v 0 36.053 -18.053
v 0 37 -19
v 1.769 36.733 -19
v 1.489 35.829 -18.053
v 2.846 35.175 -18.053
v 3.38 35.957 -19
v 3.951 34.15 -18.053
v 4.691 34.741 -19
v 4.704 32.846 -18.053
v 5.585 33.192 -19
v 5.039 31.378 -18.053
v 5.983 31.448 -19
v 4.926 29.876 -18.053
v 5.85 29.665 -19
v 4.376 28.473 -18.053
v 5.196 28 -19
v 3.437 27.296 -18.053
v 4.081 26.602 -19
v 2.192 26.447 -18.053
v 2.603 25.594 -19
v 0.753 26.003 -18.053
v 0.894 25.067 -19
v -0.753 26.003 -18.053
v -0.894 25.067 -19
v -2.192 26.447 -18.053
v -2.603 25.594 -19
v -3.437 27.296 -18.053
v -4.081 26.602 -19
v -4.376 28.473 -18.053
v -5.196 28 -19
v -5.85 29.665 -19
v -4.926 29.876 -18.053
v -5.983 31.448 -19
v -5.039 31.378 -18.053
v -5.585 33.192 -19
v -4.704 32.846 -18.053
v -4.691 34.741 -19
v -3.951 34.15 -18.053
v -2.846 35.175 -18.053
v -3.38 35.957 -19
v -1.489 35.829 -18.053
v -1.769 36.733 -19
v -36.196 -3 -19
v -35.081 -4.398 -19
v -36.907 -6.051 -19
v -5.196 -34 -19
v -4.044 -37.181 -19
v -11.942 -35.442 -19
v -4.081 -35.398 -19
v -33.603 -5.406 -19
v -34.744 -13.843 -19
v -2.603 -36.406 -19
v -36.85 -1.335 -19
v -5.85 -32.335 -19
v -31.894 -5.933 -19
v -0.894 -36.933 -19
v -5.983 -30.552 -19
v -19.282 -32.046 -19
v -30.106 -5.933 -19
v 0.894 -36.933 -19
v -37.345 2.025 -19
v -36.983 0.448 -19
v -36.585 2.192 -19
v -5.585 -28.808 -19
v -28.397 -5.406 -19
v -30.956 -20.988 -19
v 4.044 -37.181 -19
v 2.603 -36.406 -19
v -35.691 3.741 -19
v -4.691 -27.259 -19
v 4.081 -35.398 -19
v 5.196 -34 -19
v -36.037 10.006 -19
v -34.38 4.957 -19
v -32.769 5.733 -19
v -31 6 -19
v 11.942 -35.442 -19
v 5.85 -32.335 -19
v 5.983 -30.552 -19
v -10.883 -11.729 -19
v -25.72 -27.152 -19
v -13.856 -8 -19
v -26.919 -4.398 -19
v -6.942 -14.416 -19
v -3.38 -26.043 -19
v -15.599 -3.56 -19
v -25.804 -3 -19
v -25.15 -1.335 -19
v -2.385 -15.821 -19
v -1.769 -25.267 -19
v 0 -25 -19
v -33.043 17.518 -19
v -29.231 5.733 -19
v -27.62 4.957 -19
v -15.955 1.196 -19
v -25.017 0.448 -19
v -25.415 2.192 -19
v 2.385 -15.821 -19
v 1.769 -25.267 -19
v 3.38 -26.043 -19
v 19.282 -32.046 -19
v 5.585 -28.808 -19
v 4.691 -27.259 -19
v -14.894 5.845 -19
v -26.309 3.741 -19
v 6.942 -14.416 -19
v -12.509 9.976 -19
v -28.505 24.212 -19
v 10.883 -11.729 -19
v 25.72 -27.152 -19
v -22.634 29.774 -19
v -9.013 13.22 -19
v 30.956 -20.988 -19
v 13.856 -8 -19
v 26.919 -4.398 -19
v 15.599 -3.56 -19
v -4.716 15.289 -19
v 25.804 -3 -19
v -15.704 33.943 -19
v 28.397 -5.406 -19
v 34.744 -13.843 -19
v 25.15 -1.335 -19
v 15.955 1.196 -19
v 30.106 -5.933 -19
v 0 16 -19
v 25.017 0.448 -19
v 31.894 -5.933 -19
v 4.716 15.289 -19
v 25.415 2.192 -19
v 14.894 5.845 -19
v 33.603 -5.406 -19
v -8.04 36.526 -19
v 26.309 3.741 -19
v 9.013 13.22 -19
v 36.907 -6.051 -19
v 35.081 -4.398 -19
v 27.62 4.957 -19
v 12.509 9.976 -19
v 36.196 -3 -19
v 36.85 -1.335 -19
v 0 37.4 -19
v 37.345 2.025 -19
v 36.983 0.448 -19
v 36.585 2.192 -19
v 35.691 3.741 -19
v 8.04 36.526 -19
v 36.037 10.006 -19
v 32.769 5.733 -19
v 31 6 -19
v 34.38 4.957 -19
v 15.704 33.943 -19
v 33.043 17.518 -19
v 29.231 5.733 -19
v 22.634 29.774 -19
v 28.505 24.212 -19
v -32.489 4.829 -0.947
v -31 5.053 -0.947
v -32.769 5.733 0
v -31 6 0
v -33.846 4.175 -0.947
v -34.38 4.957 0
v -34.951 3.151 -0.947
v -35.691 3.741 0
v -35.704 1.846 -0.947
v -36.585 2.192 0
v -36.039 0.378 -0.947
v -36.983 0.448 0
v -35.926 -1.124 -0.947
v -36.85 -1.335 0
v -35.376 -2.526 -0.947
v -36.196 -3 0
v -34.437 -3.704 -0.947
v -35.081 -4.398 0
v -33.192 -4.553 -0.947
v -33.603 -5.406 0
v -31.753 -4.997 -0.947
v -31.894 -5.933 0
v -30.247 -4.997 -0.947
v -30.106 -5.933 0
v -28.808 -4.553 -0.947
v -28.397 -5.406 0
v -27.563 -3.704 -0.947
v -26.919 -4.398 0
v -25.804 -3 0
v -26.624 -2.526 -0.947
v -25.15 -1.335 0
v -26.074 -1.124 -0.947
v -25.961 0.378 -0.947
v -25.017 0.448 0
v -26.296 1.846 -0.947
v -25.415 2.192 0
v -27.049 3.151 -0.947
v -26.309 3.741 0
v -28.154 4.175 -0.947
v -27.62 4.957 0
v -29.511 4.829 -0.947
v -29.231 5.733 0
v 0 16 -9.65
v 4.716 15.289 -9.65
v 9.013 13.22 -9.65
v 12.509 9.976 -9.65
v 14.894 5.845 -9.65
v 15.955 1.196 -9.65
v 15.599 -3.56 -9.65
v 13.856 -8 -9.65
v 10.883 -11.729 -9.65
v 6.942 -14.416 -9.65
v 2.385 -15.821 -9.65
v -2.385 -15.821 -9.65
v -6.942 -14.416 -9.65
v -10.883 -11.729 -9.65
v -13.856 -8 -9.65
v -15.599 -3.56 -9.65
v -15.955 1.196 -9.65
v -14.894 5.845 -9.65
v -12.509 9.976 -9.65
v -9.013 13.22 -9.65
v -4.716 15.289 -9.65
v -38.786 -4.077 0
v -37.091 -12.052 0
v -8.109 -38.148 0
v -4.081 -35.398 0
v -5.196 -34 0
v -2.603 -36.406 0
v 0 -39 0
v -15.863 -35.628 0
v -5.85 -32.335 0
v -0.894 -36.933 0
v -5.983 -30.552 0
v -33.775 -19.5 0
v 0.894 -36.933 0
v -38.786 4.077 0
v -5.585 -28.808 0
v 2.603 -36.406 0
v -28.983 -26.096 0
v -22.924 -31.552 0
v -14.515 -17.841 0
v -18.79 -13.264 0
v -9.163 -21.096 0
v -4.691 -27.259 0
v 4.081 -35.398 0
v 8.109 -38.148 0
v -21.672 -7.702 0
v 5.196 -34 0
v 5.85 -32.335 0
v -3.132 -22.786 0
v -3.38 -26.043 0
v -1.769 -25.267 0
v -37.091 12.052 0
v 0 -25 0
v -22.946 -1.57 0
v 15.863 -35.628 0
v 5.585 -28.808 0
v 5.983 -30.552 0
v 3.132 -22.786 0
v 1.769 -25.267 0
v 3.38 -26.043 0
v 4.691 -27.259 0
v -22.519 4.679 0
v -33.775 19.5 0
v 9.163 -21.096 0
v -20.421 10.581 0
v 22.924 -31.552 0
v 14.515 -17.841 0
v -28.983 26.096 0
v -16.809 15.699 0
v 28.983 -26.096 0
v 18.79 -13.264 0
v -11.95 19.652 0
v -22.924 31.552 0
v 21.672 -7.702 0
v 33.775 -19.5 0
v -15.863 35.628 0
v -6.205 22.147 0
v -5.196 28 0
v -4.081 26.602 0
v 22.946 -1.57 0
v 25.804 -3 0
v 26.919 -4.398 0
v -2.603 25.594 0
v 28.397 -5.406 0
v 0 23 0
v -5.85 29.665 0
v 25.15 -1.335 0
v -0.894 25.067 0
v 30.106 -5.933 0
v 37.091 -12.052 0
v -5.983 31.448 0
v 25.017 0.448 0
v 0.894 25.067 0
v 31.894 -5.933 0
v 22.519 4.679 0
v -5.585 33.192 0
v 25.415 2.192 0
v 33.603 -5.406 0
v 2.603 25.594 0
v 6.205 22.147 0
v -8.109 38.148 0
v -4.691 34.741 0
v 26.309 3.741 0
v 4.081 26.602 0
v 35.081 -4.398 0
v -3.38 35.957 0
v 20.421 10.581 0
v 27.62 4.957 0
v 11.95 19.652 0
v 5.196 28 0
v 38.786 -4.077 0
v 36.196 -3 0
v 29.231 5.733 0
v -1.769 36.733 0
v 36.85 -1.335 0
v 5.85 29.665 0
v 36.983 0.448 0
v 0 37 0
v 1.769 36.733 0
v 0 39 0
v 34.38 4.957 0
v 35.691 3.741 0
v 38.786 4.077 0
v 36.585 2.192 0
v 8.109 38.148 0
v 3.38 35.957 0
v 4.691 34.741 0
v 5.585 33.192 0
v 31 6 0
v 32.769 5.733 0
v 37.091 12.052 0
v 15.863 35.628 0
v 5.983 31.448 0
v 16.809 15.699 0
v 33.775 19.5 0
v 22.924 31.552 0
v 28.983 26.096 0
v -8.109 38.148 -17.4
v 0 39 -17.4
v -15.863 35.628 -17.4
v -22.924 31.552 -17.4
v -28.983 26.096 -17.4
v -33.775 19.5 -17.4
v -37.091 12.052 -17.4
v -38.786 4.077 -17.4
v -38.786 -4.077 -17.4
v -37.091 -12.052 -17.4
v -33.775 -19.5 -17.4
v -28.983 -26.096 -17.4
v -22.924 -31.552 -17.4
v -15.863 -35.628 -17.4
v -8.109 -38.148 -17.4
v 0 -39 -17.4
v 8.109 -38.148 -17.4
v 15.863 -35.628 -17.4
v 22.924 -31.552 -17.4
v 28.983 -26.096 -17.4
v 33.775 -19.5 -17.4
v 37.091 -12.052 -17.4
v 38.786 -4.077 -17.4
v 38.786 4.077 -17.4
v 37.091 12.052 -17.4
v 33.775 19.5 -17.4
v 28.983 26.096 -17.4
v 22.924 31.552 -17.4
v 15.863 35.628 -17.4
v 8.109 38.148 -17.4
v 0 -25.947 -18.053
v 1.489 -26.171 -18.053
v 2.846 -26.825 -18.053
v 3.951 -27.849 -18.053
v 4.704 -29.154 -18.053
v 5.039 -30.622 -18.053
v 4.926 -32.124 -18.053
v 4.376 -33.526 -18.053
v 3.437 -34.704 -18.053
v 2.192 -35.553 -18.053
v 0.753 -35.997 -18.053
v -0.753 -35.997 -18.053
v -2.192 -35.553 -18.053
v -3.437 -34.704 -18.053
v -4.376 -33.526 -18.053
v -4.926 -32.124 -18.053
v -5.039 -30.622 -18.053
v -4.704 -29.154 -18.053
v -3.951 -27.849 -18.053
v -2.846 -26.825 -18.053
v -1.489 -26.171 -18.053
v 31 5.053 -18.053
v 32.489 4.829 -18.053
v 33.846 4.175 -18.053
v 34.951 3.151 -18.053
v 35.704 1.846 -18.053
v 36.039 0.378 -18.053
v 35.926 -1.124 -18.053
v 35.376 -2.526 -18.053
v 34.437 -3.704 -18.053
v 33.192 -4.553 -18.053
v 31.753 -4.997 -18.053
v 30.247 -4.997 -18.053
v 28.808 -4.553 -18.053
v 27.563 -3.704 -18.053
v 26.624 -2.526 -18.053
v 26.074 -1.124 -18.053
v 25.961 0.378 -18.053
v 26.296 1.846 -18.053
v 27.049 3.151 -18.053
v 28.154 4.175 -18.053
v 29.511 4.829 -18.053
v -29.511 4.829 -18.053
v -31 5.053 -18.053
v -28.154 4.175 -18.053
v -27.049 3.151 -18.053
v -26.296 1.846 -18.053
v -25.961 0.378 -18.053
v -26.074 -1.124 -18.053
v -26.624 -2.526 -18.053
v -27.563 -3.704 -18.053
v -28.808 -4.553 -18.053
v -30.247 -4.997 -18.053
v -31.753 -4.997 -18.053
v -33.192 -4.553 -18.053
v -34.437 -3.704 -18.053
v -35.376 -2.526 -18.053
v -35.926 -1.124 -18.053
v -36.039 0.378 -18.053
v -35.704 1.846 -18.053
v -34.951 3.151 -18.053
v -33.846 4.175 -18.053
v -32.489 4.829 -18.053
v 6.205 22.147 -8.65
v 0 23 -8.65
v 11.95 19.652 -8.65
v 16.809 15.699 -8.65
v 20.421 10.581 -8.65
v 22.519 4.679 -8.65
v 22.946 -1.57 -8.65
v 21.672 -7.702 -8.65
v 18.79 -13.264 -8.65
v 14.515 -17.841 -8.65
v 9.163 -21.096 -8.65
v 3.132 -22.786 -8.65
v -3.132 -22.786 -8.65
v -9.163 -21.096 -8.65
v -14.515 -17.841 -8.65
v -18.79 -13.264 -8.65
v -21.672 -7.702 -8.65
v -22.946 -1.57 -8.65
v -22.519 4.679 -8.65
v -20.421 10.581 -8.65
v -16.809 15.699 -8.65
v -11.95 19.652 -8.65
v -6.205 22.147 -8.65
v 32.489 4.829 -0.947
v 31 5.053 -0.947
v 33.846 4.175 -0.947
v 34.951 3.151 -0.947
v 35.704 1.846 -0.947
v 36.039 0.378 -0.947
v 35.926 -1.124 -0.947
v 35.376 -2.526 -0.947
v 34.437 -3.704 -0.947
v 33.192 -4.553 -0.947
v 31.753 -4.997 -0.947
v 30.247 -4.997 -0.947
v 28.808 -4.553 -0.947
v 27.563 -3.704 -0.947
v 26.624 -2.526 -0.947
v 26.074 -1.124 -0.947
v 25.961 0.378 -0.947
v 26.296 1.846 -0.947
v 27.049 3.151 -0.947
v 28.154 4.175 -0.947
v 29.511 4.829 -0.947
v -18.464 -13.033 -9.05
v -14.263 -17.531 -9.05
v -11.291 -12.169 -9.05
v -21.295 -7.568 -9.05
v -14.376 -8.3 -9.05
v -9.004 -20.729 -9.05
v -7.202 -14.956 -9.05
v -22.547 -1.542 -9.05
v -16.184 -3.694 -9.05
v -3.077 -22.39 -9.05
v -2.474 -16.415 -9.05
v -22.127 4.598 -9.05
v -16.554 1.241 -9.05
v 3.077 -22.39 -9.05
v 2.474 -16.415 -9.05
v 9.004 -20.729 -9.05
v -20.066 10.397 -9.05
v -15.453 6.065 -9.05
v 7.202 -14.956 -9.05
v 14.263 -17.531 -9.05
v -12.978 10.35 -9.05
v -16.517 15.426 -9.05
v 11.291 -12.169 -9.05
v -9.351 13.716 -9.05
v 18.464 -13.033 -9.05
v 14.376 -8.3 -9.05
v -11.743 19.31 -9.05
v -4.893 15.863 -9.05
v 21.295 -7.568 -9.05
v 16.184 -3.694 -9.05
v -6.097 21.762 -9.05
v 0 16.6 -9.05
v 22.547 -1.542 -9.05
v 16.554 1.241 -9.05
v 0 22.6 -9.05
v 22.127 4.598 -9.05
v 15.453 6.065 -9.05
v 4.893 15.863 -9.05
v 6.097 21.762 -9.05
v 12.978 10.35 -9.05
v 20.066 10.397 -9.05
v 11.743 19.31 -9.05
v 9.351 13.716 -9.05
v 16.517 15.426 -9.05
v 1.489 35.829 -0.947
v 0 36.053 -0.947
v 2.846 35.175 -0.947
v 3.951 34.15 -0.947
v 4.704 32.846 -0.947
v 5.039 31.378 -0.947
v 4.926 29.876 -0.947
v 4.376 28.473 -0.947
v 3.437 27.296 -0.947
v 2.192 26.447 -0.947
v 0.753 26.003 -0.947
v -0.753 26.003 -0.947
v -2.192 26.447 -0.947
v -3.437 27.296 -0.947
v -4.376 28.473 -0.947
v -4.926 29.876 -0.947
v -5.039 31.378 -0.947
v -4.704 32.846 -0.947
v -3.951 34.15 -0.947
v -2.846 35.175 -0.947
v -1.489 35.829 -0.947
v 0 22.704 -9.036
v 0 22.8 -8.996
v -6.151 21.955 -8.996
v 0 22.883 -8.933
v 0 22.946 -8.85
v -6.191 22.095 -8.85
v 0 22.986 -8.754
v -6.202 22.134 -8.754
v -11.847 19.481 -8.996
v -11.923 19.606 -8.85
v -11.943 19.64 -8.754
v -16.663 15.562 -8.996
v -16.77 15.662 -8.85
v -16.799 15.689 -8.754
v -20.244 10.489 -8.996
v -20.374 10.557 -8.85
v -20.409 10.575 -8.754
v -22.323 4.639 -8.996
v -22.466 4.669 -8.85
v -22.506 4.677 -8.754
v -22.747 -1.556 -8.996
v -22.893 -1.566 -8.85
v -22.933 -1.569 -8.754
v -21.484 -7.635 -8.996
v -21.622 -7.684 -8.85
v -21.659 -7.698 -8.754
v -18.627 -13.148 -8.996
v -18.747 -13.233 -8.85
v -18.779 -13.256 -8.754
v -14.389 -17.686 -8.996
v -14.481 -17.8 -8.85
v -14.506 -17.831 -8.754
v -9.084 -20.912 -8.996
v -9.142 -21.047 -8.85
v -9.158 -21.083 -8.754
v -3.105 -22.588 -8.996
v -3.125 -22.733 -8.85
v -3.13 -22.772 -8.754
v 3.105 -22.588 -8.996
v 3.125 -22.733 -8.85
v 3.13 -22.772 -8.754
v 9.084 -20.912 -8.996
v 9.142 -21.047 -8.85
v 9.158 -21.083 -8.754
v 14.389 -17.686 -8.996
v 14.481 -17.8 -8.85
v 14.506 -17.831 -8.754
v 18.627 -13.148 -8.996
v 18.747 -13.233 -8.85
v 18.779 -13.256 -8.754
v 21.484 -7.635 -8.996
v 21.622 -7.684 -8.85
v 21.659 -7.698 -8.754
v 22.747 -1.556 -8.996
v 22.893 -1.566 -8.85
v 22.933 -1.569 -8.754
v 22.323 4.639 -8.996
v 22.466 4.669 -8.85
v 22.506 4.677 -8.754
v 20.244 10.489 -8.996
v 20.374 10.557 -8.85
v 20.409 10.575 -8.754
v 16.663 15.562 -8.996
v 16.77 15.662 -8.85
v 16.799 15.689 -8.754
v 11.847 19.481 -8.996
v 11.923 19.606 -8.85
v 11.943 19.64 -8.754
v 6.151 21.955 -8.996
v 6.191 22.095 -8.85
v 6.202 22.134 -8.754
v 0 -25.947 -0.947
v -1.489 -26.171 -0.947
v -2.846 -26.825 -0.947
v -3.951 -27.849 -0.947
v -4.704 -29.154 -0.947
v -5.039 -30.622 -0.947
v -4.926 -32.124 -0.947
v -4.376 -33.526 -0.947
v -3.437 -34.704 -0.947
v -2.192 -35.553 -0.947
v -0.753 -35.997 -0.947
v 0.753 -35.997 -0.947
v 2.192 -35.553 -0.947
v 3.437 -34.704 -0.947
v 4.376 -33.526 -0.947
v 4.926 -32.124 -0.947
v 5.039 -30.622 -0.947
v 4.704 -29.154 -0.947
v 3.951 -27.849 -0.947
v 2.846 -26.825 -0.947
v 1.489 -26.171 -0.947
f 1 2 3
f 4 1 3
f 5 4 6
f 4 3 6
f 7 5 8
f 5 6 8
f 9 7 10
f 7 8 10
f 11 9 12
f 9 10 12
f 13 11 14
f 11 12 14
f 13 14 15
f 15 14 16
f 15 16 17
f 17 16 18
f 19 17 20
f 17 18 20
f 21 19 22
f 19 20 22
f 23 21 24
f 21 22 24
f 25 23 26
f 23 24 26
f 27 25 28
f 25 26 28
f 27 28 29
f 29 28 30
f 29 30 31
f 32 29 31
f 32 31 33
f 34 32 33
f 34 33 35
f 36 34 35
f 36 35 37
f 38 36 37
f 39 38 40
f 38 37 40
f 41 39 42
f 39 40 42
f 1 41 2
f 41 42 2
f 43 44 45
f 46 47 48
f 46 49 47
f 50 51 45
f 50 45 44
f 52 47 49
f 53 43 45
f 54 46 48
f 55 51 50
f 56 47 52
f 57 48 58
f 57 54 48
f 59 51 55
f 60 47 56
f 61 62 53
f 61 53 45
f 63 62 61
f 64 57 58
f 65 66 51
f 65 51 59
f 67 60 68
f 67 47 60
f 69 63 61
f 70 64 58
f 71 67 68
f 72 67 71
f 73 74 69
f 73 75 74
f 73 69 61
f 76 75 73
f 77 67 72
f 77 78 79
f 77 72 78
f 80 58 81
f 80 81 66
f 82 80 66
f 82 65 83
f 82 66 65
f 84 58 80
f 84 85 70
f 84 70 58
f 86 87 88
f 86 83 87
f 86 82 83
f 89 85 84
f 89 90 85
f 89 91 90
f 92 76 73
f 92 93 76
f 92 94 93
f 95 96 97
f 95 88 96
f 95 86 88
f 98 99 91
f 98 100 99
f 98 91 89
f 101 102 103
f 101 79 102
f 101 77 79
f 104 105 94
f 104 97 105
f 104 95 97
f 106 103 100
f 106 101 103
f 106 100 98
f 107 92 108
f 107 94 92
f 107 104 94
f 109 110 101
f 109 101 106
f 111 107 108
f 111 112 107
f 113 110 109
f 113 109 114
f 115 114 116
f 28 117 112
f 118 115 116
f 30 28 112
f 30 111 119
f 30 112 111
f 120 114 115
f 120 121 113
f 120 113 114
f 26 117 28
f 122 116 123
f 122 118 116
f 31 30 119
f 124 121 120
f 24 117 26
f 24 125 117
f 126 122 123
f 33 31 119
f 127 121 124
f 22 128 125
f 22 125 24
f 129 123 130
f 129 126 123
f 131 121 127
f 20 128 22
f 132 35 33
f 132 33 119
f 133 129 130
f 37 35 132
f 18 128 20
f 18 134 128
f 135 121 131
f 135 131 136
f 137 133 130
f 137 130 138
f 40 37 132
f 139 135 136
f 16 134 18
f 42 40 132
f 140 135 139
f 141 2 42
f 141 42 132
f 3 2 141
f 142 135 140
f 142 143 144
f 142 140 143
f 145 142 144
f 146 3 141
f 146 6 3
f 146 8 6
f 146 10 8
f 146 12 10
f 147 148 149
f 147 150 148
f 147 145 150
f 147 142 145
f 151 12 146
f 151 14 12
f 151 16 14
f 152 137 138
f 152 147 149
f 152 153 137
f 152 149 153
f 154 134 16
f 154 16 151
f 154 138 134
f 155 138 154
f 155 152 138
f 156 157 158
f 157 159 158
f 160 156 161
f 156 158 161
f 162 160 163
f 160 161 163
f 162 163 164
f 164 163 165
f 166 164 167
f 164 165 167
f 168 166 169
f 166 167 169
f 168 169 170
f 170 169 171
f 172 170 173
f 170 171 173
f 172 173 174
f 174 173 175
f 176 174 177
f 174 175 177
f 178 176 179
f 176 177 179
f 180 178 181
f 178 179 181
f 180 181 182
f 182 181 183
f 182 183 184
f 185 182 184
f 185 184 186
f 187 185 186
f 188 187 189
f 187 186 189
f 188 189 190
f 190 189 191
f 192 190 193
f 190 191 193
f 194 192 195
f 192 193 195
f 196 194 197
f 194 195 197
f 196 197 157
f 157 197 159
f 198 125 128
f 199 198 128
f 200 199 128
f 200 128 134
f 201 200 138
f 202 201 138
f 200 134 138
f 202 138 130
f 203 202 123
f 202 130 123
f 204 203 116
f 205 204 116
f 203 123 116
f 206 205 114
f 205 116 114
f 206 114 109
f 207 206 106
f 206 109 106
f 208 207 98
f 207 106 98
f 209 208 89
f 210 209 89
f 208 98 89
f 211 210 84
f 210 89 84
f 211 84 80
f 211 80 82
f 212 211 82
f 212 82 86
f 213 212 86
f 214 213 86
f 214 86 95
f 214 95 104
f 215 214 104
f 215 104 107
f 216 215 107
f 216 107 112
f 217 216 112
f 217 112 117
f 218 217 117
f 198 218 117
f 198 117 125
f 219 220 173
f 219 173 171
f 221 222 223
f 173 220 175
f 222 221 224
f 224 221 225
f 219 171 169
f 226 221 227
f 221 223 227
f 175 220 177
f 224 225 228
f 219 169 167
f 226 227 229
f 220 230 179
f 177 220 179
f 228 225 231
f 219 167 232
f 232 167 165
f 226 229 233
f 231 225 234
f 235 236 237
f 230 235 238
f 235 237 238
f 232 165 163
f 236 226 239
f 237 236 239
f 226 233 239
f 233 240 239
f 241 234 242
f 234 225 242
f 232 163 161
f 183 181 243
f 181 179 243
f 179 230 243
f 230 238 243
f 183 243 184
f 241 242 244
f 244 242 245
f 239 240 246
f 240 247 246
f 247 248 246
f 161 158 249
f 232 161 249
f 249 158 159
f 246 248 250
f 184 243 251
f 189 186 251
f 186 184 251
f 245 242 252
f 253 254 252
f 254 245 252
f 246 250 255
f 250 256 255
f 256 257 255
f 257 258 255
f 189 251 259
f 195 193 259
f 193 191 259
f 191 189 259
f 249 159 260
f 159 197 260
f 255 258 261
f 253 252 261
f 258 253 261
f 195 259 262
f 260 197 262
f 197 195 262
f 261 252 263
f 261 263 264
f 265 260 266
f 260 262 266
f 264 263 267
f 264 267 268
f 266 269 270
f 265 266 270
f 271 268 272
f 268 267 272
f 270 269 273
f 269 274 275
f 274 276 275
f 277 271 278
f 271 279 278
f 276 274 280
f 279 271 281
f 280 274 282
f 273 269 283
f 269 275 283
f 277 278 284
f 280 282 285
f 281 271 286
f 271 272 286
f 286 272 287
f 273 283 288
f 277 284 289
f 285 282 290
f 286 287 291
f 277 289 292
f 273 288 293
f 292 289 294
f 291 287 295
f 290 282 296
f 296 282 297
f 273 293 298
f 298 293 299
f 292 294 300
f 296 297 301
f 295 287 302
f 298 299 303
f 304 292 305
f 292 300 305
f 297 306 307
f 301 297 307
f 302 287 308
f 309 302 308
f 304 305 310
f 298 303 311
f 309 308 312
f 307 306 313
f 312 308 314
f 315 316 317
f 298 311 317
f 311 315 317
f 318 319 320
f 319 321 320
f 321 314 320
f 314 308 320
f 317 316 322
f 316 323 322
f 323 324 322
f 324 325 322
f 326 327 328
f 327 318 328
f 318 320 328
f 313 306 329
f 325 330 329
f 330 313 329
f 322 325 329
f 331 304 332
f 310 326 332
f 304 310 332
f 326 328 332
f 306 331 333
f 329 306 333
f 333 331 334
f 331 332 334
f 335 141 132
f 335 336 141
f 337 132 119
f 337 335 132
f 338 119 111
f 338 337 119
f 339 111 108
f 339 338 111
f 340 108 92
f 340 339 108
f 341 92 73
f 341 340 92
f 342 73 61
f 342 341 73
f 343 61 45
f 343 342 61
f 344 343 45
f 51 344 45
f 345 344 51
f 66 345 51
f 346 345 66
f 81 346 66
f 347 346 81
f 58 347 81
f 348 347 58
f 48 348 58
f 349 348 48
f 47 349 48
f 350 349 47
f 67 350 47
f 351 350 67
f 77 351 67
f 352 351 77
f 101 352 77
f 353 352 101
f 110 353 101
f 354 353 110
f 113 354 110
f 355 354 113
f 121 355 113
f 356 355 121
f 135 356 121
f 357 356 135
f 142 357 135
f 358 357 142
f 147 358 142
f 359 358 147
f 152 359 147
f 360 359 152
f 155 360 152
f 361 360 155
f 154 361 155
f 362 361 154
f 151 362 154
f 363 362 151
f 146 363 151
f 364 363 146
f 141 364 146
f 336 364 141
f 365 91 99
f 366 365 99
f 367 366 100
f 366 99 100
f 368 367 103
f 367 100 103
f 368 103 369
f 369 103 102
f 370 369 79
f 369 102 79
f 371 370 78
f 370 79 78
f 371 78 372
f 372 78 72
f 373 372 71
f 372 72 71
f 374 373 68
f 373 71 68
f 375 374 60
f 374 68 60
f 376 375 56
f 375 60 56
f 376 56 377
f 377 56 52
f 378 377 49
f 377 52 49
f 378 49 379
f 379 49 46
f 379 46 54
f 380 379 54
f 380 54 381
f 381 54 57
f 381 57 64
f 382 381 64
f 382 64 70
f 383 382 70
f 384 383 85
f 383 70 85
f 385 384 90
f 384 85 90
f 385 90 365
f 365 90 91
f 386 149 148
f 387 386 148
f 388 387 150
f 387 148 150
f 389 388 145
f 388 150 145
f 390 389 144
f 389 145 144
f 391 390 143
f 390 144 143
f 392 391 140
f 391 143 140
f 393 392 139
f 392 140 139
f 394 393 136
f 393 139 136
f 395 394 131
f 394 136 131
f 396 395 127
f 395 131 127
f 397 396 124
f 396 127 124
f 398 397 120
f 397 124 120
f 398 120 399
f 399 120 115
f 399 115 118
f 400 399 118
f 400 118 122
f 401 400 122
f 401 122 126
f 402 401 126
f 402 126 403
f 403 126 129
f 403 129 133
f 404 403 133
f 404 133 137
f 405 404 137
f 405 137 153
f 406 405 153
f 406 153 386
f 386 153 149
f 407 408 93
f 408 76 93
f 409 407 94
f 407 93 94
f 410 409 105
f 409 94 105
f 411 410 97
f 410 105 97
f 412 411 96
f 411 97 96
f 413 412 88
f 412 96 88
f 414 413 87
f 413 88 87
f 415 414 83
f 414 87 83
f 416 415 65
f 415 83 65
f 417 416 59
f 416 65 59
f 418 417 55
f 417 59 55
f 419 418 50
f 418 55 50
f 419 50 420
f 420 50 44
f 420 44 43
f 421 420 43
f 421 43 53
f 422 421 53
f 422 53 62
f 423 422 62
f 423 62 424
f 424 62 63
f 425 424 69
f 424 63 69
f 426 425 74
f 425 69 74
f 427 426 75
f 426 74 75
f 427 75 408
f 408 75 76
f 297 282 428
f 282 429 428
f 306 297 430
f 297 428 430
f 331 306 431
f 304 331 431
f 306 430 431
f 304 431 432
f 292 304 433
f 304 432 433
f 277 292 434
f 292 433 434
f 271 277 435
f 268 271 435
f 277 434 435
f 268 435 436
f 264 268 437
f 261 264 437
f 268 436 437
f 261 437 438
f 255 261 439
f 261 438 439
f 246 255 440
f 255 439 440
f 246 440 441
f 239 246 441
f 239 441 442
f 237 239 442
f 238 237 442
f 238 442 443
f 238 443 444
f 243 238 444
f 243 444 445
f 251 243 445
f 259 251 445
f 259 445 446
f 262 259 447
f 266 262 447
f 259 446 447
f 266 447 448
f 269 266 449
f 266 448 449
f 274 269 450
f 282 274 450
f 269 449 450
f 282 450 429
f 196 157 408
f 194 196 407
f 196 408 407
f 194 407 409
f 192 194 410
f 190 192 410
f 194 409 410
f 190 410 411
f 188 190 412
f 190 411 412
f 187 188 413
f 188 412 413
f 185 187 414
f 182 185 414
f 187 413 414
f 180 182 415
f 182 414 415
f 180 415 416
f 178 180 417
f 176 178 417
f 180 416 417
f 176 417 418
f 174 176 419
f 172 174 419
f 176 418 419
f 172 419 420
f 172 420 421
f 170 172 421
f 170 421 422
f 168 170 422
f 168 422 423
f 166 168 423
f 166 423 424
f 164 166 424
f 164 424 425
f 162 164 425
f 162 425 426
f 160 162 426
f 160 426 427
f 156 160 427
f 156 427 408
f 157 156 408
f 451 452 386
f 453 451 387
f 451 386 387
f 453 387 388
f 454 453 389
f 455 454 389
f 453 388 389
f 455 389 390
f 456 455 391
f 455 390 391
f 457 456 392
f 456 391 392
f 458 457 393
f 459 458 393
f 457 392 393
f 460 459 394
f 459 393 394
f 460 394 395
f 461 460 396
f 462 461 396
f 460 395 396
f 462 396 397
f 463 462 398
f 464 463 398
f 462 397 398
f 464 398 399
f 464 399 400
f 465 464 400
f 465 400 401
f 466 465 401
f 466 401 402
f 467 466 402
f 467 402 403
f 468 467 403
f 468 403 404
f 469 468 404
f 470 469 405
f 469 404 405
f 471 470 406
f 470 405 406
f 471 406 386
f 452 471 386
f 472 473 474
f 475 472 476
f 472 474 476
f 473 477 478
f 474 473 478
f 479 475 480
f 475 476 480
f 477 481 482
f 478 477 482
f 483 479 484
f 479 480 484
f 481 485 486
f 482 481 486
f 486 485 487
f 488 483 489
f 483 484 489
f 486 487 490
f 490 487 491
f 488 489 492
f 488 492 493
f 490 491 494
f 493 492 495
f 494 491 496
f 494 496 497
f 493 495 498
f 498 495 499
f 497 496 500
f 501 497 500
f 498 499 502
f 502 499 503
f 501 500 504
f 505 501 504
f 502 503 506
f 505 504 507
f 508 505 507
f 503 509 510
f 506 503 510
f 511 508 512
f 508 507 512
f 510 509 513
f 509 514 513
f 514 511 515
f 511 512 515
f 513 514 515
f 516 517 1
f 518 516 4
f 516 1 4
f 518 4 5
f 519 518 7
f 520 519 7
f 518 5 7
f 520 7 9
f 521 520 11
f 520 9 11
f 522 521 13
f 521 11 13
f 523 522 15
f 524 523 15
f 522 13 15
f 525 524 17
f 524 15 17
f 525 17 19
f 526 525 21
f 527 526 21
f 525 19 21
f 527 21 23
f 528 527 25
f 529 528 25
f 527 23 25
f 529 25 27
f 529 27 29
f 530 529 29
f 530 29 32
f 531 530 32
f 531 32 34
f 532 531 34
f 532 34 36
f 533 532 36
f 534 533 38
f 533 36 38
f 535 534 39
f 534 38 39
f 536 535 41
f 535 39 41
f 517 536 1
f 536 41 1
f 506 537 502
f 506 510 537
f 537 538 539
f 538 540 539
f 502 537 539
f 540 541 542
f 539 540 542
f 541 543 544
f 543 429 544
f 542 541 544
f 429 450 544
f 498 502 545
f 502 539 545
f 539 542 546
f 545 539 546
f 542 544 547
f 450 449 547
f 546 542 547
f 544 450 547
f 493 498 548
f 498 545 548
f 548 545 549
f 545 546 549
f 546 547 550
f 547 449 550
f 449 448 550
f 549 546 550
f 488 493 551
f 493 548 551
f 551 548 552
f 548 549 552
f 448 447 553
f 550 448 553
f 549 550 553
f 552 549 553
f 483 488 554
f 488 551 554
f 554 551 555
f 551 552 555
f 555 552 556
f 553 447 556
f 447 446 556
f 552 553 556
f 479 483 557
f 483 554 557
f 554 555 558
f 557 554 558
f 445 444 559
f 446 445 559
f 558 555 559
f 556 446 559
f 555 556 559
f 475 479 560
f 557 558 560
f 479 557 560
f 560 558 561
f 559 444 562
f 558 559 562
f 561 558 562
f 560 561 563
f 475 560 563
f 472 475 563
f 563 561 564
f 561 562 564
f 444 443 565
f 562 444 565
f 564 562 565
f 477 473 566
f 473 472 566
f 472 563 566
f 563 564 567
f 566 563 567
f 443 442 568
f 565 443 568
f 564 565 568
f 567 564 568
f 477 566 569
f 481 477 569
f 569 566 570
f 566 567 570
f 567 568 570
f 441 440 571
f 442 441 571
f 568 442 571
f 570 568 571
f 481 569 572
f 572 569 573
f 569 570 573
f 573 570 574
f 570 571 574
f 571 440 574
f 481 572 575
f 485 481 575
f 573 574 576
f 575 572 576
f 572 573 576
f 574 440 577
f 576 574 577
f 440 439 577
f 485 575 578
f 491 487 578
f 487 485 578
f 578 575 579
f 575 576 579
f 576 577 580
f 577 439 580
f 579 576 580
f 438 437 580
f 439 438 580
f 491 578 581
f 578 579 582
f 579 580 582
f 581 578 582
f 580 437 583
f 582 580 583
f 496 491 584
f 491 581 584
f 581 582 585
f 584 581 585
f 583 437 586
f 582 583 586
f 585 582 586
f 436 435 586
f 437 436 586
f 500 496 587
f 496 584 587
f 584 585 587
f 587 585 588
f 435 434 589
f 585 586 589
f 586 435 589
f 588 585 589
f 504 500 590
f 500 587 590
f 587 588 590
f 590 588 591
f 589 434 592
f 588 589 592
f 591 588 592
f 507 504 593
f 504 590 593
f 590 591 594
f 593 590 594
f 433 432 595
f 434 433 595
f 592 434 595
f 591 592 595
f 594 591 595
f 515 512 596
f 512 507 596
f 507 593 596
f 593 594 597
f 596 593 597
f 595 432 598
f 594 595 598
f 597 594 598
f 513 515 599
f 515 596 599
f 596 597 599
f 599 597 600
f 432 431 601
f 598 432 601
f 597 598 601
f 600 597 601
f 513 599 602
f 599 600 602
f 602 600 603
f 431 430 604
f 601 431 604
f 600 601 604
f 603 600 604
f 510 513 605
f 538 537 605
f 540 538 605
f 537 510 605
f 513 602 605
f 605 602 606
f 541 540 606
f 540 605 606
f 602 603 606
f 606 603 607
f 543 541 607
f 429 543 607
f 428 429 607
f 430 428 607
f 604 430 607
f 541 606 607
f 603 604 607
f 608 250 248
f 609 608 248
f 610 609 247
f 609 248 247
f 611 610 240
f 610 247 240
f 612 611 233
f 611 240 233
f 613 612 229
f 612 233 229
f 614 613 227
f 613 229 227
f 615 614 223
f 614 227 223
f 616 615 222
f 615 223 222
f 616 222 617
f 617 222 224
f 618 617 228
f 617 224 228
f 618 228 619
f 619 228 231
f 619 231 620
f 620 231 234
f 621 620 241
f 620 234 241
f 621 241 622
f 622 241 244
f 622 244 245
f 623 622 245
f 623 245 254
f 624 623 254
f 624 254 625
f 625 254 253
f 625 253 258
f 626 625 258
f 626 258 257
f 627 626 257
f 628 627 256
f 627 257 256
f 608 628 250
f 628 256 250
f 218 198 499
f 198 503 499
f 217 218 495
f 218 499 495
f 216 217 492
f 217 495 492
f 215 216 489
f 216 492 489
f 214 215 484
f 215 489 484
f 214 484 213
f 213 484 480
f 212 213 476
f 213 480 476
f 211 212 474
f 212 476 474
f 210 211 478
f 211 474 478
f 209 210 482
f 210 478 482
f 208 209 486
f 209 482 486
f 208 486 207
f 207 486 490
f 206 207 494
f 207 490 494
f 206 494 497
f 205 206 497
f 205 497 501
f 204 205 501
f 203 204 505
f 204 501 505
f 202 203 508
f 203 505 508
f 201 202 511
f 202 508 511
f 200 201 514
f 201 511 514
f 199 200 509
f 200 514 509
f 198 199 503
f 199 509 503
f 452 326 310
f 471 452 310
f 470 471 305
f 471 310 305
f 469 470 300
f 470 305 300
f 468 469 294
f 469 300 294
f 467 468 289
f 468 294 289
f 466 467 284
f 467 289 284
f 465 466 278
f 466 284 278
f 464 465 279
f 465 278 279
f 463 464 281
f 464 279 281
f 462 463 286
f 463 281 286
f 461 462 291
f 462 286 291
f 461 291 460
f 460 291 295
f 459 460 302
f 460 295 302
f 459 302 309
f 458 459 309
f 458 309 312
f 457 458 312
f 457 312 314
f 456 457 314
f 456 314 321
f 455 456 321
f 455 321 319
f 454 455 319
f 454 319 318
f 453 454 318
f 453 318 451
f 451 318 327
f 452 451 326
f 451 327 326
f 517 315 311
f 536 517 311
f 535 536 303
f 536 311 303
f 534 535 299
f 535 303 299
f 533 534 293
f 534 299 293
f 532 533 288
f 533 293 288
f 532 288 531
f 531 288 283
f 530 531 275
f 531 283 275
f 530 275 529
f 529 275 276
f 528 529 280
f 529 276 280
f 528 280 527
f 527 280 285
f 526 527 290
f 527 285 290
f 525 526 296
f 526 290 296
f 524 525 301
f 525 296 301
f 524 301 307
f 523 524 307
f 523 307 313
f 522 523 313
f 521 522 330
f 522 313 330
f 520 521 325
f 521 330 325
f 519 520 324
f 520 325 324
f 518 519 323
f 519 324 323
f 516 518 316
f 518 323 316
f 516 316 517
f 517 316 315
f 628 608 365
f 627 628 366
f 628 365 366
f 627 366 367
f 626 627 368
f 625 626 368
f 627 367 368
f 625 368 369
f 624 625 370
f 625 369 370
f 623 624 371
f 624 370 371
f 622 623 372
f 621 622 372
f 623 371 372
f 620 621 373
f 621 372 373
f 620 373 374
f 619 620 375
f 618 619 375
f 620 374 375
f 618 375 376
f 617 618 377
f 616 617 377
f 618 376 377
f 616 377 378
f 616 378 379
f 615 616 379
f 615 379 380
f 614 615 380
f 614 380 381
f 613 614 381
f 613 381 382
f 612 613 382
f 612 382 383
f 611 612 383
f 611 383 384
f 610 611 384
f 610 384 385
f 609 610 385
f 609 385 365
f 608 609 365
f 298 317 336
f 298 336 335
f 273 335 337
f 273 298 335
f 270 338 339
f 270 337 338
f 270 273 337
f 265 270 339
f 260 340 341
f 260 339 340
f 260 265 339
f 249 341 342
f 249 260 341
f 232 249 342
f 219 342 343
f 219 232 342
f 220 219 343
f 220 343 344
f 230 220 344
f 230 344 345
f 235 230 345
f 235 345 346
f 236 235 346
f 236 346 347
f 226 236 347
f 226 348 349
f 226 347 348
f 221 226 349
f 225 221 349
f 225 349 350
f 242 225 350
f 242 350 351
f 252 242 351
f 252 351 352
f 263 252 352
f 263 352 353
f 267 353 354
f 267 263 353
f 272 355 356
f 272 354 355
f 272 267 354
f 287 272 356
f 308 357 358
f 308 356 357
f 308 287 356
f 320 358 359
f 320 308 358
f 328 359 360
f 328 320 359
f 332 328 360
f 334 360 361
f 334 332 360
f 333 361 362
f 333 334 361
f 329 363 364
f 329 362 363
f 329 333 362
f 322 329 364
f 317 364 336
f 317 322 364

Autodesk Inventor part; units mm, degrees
sketch "Sketch_1" plane through (0, 0, 0) normal (1, 0, 0) x (0, 1, 0)
  line L0 (0, -19) -> (0, 0)
  line L1 (23, 0) -> (23, -8.65)
  arc A0 (22.6, -9.05) -> (23, -8.65) centre (22.6, -8.65) ccw
  line L2 (22.6, -9.05) -> (16.6, -9.05)
  line L3 (16.6, -9.05) -> (16, -9.65)
  line L4 (16, -9.65) -> (16, -19)
  line L5 (16, -19) -> (37.4, -19)
  line L6 (37.4, -19) -> (39, -17.4)
  line L7 (39, -17.4) -> (39, 0)
  line L8 (39, 0) -> (23, 0)
revolve "Revolution1" add sketch "Sketch_1" angle 360 about axis through (0, 0, -19) along (0, 0, -1)
sketch "Sketch_2" plane through (0, 0, 0) normal (1, 0, 0) x (0, 1, 0)
  line L0 (31, -19) -> (31, 0)
  line L1 (31, 0) -> (37, 0)
  line L2 (37, 0) -> (36.053, -0.947)
  line L3 (36.053, -0.947) -> (36.053, -18.053)
  line L4 (36.053, -18.053) -> (37, -19)
  line L5 (37, -19) -> (31, -19)
  line L6 (31, -19) -> (31, 0)
revolve "Revolution2" cut sketch "Sketch_2" angle 360 about axis through (0, 31, -19) along (0, 0, -1)
thread "Thread1" size "M12x1.75" class "6H" standard "ISO Metric profile" full length
pattern_linear "Rectangular Pattern1" count 2 spacing 43.8406 along (-0.7071, -0.7071, 0) count 2 spacing 43.8406 along (0.7071, -0.7071, 0) of "Revolution2"
ref_plane "ANBAU_XY" through (0, 0, 0) normal (0, 0, 1) x (1, 0, 0)
ref_plane "ANBAU_YZ" through (0, 0, 0) normal (1, 0, 0) x (0, 1, 0)
ref_plane "ANBAU_ZX" through (0, 0, 0) normal (0, 1, 0) x (0, 0, 1)
ref_plane "EP_IP_XY" through (0, 0, -9.05) normal (0, 0, -1) x (1, 0, 0)
ref_plane "EP_IP_YZ" through (0, 0, -9.05) normal (1, 0, 0) x (0, -1, 0)
ref_plane "EP_IP_ZX" through (0, 0, -9.05) normal (0, -1, 0) x (0, 0, -1)
properties part number "1559396 EAGF-V2-KF-100---(R)"
